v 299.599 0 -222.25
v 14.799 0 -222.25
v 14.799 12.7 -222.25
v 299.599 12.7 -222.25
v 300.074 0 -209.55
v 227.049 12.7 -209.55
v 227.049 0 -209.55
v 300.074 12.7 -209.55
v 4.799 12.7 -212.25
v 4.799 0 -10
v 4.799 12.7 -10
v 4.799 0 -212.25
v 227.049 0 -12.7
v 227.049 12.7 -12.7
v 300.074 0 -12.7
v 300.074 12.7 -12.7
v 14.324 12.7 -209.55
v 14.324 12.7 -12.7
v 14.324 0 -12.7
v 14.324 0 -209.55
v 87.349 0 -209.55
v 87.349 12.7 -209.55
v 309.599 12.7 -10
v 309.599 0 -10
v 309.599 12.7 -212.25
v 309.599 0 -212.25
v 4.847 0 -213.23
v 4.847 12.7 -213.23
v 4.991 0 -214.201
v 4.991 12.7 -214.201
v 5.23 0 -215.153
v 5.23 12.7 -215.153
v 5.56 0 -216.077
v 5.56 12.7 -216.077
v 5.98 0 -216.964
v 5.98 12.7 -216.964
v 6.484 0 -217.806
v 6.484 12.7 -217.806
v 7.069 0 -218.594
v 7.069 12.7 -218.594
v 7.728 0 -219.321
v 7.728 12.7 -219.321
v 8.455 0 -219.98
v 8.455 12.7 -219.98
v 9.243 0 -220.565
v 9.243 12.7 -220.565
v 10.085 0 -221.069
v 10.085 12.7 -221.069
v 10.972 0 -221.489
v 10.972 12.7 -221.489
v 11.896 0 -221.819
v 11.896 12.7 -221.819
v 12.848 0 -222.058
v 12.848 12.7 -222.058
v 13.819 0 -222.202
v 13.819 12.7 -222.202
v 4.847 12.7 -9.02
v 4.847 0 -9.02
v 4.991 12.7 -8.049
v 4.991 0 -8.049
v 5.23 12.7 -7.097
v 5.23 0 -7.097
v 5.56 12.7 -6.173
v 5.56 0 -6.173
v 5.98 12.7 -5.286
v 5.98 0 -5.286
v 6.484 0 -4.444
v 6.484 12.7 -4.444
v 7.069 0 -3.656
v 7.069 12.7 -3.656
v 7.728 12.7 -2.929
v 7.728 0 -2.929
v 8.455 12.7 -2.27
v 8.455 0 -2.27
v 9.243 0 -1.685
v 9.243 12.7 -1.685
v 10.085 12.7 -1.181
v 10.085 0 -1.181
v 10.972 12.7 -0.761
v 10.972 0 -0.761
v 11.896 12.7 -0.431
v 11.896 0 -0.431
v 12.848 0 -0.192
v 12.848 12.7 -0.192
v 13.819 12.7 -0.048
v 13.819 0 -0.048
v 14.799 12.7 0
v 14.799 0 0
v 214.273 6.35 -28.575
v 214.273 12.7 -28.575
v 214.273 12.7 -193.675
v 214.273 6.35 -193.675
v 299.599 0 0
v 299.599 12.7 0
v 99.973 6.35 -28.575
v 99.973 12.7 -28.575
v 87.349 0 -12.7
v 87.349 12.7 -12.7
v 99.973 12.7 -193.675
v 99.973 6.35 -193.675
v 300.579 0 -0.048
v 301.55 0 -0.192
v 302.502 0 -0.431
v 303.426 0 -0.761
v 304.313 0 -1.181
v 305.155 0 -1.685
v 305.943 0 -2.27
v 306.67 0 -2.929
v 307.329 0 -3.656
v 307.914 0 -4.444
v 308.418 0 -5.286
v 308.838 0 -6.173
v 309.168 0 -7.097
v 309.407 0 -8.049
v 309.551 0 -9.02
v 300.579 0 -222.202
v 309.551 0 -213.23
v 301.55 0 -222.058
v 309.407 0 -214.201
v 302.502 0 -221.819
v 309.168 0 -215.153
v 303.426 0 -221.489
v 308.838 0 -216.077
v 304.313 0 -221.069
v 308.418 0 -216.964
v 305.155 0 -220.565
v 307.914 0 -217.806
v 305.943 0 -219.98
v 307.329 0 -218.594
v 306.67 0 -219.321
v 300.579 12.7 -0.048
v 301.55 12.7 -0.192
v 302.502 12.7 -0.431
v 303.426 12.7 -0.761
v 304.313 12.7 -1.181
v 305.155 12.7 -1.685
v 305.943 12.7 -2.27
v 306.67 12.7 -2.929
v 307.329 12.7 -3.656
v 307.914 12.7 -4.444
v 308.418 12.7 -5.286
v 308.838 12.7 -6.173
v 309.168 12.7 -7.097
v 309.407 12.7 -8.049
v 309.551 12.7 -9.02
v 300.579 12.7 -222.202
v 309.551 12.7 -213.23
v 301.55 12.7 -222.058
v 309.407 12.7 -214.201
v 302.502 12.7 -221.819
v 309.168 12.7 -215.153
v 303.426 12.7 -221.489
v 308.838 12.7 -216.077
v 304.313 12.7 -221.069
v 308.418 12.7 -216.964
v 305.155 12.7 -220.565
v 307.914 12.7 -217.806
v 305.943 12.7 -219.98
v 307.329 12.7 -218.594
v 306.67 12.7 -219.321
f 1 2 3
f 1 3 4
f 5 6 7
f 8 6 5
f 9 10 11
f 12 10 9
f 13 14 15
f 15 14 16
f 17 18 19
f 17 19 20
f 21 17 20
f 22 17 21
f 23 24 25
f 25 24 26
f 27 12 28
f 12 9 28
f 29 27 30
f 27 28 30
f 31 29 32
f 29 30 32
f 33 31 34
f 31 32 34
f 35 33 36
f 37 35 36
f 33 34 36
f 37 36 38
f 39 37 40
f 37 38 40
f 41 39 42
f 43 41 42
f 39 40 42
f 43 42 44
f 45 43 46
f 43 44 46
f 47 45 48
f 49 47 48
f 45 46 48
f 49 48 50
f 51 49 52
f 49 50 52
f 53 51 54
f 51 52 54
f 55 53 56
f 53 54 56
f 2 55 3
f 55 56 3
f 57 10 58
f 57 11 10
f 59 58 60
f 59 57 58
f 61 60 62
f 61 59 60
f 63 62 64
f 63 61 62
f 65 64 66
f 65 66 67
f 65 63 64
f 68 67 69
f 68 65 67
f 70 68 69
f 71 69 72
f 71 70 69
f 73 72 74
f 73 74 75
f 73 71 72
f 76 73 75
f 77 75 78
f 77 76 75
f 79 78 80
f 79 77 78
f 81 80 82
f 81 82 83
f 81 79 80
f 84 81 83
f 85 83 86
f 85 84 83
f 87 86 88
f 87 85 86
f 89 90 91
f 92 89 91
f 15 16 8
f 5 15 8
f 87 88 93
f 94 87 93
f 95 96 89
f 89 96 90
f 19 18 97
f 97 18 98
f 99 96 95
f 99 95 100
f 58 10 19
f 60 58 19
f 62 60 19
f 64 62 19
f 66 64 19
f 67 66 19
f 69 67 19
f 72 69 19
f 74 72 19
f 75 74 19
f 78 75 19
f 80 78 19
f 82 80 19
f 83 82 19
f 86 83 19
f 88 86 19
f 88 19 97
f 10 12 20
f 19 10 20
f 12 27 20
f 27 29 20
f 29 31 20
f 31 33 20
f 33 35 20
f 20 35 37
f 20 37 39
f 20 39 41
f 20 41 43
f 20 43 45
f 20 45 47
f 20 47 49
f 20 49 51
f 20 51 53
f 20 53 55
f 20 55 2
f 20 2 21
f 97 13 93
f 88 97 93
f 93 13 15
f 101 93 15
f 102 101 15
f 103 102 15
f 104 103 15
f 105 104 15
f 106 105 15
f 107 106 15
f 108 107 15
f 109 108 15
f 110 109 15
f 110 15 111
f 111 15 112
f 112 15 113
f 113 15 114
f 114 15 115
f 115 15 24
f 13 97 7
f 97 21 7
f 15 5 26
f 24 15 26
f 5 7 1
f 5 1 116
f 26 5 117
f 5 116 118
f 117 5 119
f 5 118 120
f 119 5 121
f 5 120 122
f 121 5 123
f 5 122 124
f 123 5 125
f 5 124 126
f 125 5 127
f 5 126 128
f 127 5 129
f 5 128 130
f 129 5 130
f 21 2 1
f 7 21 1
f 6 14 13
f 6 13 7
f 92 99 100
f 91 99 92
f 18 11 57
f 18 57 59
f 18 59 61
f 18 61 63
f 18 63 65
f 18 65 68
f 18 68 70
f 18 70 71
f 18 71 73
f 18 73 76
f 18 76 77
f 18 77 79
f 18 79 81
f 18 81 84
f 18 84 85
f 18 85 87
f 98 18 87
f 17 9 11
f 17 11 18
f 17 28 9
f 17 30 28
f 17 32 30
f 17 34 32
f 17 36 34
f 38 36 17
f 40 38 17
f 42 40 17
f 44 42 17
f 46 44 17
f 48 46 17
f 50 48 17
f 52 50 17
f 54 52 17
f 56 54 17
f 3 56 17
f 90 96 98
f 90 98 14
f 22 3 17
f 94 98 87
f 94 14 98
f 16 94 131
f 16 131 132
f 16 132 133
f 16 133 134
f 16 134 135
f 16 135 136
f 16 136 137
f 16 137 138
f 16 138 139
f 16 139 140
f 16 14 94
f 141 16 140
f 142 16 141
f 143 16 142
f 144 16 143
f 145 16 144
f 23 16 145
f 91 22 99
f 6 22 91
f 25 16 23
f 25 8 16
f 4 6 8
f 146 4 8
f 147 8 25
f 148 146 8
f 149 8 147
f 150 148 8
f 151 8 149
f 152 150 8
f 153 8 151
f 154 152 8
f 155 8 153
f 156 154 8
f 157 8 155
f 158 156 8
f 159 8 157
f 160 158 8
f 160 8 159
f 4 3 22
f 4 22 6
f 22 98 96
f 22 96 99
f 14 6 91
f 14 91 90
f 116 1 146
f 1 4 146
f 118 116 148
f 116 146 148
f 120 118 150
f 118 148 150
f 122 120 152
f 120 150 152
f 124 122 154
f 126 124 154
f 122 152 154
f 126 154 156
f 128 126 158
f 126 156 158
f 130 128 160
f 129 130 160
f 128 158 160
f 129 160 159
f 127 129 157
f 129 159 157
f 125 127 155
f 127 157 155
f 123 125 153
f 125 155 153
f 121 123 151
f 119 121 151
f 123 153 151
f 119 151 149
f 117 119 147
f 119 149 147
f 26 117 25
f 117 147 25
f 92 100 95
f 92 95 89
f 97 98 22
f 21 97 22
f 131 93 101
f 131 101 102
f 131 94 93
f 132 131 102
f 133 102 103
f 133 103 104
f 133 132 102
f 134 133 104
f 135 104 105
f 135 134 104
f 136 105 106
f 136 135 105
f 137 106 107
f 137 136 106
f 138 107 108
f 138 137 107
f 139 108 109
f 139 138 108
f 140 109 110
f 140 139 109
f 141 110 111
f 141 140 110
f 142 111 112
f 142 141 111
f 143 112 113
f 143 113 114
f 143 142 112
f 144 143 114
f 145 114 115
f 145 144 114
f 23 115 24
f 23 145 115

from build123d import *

# Parameters (mm, degrees)
SKETCH1_W           = 304.8
SKETCH1_H           = 222.25
BOSS_EXTRUDE1_DEPTH = 12.7
SKETCH2_W           = 73.025
SKETCH2_H           = 196.85
CUT_EXTRUDE1_DEPTH  = 12.7
SKETCH3_W           = 114.3
SKETCH3_H           = 165.1
CUT_EXTRUDE2_DEPTH  = 6.35
FILLET1_R           = 10


with BuildPart() as part:
    # Sketch1 → Boss-Extrude1 (new body)
    with BuildSketch(Plane(origin=(0, 0, 0), x_dir=(1, 0, 0), z_dir=(0, 1, 0))):
        with Locations((157.198920378, 111.125)):
            Rectangle(SKETCH1_W, SKETCH1_H)
    extrude(amount=BOSS_EXTRUDE1_DEPTH)

    # Sketch2 → Cut-Extrude1 (cut)
    with BuildSketch(Plane(origin=(0, 12.7, 0), x_dir=(1, 0, 0), z_dir=(0, 1, 0))):
        with Locations((50.836420378, 111.125)):
            Rectangle(SKETCH2_W, SKETCH2_H)
        with Locations((263.561420378, 111.125)):
            Rectangle(SKETCH2_W, SKETCH2_H)
    extrude(amount=-CUT_EXTRUDE1_DEPTH, mode=Mode.SUBTRACT)

    # Sketch3 → Cut-Extrude2 (cut)
    with BuildSketch(Plane(origin=(0, 12.7, 0), x_dir=(1, 0, 0), z_dir=(0, 1, 0))):
        with Locations((157.123394244, 111.125)):
            Rectangle(SKETCH3_W, SKETCH3_H)
    extrude(amount=-CUT_EXTRUDE2_DEPTH, mode=Mode.SUBTRACT)

    # Fillet1
    fillet1_edges = [part.edges().sort_by_distance(p)[0] for p in [
        (4.798920378, 6.35, -222.25),
        (309.598920378, 6.35, -222.25),
        (309.598920378, 6.35, 0),
        (4.798920378, 6.35, 0),
    ]]
    fillet(fillet1_edges, radius=FILLET1_R)


solid = part.part
